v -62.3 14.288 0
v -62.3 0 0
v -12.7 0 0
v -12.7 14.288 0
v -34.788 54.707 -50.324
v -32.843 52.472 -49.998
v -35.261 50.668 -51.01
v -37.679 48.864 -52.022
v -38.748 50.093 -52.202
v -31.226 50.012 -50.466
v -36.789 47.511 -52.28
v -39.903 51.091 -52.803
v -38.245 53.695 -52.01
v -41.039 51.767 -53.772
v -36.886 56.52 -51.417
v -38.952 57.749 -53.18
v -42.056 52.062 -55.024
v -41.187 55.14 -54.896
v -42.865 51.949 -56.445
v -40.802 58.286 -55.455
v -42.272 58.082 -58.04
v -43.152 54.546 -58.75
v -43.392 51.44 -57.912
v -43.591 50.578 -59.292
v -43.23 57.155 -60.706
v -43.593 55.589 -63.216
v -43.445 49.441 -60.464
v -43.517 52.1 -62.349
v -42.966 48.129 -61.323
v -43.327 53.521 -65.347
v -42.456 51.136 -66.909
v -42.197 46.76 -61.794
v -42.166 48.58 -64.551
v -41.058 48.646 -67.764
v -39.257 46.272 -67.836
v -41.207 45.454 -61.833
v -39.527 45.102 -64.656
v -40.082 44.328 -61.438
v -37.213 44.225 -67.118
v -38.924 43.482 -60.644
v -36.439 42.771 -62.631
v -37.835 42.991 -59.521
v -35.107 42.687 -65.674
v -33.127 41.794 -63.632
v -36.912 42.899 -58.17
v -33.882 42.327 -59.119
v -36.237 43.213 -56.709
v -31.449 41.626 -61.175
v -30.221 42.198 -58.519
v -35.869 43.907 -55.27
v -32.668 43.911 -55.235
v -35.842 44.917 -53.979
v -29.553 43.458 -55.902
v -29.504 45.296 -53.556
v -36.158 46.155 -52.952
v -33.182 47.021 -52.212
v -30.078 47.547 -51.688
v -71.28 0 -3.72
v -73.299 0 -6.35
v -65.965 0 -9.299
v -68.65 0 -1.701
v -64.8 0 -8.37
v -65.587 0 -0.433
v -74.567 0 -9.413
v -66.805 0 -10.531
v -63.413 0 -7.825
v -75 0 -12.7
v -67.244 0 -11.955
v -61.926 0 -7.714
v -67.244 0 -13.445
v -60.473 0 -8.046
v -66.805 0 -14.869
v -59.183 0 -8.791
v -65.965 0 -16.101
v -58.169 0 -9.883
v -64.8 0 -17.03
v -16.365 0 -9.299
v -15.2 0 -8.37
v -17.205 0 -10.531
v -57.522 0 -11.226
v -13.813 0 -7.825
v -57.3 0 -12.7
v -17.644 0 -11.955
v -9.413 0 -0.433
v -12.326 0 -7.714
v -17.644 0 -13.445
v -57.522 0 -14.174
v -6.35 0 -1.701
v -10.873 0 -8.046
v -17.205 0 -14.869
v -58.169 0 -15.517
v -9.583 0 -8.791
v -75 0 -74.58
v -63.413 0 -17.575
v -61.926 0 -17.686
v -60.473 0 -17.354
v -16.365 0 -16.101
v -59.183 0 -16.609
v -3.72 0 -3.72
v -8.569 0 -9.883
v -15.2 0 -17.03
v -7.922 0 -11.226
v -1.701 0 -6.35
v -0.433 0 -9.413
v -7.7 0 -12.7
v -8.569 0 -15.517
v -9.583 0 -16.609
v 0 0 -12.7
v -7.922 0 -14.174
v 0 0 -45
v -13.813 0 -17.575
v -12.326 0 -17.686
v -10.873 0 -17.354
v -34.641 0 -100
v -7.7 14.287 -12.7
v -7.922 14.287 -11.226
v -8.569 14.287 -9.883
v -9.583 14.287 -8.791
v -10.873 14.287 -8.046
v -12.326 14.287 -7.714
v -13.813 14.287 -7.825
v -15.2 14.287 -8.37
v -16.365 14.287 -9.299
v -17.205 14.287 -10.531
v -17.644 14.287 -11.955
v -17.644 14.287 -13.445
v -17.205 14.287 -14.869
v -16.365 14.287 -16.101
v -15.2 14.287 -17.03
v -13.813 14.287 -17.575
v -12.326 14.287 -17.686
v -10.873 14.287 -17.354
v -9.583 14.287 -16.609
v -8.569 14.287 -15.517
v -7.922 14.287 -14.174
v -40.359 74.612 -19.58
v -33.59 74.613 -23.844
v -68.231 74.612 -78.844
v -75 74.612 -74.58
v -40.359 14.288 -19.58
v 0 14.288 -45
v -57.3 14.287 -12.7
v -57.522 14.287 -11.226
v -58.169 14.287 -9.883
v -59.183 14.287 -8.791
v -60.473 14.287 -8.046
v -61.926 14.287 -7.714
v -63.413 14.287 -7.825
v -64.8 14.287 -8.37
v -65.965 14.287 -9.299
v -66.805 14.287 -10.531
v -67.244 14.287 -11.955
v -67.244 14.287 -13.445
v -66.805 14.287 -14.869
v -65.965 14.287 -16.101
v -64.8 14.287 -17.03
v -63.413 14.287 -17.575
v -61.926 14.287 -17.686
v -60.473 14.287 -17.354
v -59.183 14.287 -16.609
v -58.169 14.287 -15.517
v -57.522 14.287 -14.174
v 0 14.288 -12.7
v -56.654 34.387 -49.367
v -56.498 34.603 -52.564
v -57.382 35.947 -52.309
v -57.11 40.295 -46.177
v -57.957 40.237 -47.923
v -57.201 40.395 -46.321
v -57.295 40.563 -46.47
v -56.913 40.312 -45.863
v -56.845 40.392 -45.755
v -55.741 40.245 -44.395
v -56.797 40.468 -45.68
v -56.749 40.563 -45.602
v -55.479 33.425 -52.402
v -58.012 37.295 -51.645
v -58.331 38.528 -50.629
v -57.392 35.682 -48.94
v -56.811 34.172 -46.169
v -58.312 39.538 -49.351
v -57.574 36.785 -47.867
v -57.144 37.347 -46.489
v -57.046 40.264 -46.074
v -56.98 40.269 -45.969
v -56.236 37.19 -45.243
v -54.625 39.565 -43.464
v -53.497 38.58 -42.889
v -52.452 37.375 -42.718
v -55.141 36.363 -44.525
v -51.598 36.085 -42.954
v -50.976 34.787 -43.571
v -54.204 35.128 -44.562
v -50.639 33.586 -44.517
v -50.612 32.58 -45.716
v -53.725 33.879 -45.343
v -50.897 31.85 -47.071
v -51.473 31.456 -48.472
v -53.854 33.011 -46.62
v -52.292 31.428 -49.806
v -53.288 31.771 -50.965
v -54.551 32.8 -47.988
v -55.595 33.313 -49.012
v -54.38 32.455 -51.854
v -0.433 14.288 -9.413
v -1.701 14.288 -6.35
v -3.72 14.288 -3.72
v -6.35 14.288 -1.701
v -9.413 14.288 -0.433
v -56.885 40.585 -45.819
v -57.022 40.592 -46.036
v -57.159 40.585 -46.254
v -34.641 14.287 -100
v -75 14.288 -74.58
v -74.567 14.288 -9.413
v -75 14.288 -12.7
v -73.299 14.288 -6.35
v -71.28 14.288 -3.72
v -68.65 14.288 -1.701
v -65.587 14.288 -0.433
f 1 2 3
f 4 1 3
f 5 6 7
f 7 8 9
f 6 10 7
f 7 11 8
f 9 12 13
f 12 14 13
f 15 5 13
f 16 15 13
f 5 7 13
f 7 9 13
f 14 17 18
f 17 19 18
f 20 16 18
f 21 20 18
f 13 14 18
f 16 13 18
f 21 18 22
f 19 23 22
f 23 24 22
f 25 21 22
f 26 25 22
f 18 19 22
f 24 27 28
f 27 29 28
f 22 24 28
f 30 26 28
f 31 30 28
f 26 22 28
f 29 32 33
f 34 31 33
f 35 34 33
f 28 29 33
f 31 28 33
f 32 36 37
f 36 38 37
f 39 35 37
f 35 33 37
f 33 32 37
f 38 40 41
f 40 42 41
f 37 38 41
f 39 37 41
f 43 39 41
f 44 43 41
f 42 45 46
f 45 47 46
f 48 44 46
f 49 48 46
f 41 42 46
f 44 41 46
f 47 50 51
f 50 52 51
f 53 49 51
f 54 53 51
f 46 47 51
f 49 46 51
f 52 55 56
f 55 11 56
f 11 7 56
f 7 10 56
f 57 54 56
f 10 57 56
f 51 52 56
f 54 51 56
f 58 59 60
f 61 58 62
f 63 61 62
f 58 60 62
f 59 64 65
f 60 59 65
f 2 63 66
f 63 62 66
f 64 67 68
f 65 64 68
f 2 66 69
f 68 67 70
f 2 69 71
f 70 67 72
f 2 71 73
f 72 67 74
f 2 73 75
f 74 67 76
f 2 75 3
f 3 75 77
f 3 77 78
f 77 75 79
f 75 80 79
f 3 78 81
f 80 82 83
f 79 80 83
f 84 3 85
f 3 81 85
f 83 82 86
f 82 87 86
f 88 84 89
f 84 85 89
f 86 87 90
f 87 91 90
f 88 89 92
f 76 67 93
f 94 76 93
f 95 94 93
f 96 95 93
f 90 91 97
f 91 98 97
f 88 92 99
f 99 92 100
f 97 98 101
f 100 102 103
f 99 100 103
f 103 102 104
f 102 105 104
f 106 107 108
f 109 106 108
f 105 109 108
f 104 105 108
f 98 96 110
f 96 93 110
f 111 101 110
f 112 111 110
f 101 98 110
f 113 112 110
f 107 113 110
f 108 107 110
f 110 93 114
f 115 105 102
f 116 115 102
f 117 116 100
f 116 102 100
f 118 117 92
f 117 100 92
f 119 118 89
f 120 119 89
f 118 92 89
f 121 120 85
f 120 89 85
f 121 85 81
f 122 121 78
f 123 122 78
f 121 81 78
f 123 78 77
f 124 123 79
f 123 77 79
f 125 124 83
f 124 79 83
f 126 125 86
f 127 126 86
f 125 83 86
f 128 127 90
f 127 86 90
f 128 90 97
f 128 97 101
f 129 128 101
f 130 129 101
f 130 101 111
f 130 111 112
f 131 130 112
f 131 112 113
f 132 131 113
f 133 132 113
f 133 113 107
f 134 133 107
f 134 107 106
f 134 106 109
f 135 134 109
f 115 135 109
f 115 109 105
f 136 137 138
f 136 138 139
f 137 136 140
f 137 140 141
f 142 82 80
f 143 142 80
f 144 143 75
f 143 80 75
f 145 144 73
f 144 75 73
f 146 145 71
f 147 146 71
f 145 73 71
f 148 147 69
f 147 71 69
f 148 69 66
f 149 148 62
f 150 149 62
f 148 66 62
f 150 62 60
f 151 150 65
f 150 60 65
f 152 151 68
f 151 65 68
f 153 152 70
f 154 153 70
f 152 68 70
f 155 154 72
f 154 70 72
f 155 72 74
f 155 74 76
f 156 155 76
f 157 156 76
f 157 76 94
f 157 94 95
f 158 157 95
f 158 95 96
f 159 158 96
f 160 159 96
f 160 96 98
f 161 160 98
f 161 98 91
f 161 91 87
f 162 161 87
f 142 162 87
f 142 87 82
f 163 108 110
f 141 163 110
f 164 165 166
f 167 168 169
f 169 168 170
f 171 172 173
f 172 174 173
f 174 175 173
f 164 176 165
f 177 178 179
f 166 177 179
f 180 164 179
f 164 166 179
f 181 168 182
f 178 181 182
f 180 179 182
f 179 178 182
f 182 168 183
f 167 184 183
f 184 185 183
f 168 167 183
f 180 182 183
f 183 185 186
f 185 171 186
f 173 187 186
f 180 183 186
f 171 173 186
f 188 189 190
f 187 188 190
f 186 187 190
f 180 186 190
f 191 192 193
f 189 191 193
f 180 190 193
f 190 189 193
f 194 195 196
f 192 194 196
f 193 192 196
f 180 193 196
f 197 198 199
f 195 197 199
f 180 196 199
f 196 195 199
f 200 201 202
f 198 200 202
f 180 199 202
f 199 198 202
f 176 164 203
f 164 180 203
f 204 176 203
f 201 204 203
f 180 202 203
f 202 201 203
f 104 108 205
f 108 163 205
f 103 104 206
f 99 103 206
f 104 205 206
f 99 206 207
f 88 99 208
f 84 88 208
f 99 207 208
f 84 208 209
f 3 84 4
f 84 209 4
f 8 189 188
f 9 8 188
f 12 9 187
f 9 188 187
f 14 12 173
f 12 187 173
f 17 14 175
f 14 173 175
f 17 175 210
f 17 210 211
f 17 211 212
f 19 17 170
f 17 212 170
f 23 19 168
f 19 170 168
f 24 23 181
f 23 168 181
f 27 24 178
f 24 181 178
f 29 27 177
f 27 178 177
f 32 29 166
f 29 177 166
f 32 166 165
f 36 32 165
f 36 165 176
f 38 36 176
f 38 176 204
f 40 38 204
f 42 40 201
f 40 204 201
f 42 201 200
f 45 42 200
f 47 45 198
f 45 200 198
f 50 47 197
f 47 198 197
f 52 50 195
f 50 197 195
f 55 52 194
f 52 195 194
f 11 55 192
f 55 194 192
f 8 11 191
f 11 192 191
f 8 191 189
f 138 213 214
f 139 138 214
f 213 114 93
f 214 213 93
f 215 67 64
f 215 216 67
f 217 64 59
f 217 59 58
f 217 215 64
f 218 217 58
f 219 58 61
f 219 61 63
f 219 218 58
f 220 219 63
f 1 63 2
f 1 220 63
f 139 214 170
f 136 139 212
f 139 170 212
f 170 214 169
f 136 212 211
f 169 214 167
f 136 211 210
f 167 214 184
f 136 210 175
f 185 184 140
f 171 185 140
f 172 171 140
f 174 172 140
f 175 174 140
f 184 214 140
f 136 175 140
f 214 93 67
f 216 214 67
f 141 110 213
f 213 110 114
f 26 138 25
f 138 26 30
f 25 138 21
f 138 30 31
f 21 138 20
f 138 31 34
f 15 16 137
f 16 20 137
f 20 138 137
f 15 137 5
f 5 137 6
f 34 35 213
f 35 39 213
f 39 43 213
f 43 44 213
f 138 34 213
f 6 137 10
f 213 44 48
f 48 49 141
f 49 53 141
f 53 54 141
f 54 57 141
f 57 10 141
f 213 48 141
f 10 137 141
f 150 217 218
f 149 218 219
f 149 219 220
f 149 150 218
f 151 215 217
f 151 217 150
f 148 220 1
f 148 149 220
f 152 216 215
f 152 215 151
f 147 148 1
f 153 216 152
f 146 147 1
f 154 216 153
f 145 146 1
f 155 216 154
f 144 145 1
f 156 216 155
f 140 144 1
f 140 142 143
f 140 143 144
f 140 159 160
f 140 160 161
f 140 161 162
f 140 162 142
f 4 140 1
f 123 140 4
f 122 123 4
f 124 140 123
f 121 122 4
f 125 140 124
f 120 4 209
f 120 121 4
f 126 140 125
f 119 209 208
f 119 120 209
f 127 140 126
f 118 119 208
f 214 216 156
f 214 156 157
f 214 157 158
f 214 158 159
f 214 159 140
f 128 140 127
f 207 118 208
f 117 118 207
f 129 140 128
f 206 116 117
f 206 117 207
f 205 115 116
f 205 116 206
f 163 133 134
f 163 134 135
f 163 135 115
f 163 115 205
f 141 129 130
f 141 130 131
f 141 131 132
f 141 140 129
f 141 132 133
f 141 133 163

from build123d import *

# Parameters (mm, degrees)
BASE_EXTRUDE_DEPTH                               = 14.2875
BOSS_EXTRUDE1_DEPTH                              = 60.325
CUT_EXTRUDE1_DEPTH                               = 115.691718555
CSK_FOR_M10_FLAT_HEAD_MACHINE_SCREW1_D           = 11
CSK_FOR_M10_FLAT_HEAD_MACHINE_SCREW1_DEPTH       = 25.4
CSK_FOR_M10_FLAT_HEAD_MACHINE_SCREW1_CSINK_D     = 20
CSK_FOR_M10_FLAT_HEAD_MACHINE_SCREW1_CSINK_ANGLE = 90
CSK_FOR_M10_FLAT_HEAD_MACHINE_SCREW1_TIP         = 3.304733405
FILLET1_R                                        = 12.7
F_10_0_10_DIAMETER_HOLE1_D                       = 10


with BuildPart() as part:
    # Sketch1 → Base-Extrude (new body)
    with BuildSketch(Plane(origin=(0, 0, 0), x_dir=(1, 0, 0), z_dir=(0, 1, 0))):
        Polygon((0, 0), (0, 45), (-34.641016151, 100), (-75, 74.580432521), (-75, 0), align=None)
    extrude(amount=BASE_EXTRUDE_DEPTH)

    # Sketch2 → Boss-Extrude1 (add)
    with BuildSketch(Plane(origin=(0, 14.2875, 0), x_dir=(-1, 0, 0), z_dir=(0, 1, 0))):
        Polygon((34.641016151, -100), (75, -74.580432521), (40.358983849, -19.580432521), (0, -45), align=None)
    extrude(amount=BOSS_EXTRUDE1_DEPTH)

    # Sketch3 → Cut-Extrude1 (cut, through all)
    with BuildSketch(Plane(origin=(-20.292666266, 0, -32.218934911), x_dir=(0.846153846153846, 0, -0.5329387100211933), z_dir=(0.5329387100211932, 0, 0.8461538461538459))):
        Polygon((-138.006469686, 260.451535778), (-15.714738961, 74.6125), (23.982241951, 14.2875), (146.273972676, -171.551535778), (517.952044233, 73.031925672), (233.67160187, 505.034997229), align=None)
    extrude(amount=-CUT_EXTRUDE1_DEPTH, mode=Mode.SUBTRACT)

    # CSK for M10 Flat Head Machine Screw1
    with Locations(Plane(origin=(19.712140487, 15.330086336, -12.415428673), x_dir=(-0.36778462315379085, -0.25201220679427455, -0.8951113442462362), z_dir=(0.7068403651551289, 0.549708126864638, -0.4451939728324442))):
        with Locations((53.6091088, 60.43353944)):
            CounterSinkHole(CSK_FOR_M10_FLAT_HEAD_MACHINE_SCREW1_D / 2, CSK_FOR_M10_FLAT_HEAD_MACHINE_SCREW1_CSINK_D / 2, depth=CSK_FOR_M10_FLAT_HEAD_MACHINE_SCREW1_DEPTH, counter_sink_angle=CSK_FOR_M10_FLAT_HEAD_MACHINE_SCREW1_CSINK_ANGLE)
            with Locations((0, 0, -(CSK_FOR_M10_FLAT_HEAD_MACHINE_SCREW1_DEPTH + CSK_FOR_M10_FLAT_HEAD_MACHINE_SCREW1_TIP / 2))):  # 118° drill point
                Cone(0, CSK_FOR_M10_FLAT_HEAD_MACHINE_SCREW1_D / 2, CSK_FOR_M10_FLAT_HEAD_MACHINE_SCREW1_TIP, mode=Mode.SUBTRACT)

    # Fillet1
    fillet1_edges = [part.edges().sort_by_distance(p)[0] for p in [
        (0, 7.14375, 0),
        (-75, 7.14375, 0),
    ]]
    fillet(fillet1_edges, radius=FILLET1_R)

    # Ø10.0 (10) Diameter Hole1 (through all)
    with Locations(Plane(origin=(0, 14.2875, 0), x_dir=(-1, 0, 0), z_dir=(0, 1, 0))):
        with Locations((12.7, -12.7), (62.3, -12.7)):
            Hole(F_10_0_10_DIAMETER_HOLE1_D / 2)


solid = part.part
